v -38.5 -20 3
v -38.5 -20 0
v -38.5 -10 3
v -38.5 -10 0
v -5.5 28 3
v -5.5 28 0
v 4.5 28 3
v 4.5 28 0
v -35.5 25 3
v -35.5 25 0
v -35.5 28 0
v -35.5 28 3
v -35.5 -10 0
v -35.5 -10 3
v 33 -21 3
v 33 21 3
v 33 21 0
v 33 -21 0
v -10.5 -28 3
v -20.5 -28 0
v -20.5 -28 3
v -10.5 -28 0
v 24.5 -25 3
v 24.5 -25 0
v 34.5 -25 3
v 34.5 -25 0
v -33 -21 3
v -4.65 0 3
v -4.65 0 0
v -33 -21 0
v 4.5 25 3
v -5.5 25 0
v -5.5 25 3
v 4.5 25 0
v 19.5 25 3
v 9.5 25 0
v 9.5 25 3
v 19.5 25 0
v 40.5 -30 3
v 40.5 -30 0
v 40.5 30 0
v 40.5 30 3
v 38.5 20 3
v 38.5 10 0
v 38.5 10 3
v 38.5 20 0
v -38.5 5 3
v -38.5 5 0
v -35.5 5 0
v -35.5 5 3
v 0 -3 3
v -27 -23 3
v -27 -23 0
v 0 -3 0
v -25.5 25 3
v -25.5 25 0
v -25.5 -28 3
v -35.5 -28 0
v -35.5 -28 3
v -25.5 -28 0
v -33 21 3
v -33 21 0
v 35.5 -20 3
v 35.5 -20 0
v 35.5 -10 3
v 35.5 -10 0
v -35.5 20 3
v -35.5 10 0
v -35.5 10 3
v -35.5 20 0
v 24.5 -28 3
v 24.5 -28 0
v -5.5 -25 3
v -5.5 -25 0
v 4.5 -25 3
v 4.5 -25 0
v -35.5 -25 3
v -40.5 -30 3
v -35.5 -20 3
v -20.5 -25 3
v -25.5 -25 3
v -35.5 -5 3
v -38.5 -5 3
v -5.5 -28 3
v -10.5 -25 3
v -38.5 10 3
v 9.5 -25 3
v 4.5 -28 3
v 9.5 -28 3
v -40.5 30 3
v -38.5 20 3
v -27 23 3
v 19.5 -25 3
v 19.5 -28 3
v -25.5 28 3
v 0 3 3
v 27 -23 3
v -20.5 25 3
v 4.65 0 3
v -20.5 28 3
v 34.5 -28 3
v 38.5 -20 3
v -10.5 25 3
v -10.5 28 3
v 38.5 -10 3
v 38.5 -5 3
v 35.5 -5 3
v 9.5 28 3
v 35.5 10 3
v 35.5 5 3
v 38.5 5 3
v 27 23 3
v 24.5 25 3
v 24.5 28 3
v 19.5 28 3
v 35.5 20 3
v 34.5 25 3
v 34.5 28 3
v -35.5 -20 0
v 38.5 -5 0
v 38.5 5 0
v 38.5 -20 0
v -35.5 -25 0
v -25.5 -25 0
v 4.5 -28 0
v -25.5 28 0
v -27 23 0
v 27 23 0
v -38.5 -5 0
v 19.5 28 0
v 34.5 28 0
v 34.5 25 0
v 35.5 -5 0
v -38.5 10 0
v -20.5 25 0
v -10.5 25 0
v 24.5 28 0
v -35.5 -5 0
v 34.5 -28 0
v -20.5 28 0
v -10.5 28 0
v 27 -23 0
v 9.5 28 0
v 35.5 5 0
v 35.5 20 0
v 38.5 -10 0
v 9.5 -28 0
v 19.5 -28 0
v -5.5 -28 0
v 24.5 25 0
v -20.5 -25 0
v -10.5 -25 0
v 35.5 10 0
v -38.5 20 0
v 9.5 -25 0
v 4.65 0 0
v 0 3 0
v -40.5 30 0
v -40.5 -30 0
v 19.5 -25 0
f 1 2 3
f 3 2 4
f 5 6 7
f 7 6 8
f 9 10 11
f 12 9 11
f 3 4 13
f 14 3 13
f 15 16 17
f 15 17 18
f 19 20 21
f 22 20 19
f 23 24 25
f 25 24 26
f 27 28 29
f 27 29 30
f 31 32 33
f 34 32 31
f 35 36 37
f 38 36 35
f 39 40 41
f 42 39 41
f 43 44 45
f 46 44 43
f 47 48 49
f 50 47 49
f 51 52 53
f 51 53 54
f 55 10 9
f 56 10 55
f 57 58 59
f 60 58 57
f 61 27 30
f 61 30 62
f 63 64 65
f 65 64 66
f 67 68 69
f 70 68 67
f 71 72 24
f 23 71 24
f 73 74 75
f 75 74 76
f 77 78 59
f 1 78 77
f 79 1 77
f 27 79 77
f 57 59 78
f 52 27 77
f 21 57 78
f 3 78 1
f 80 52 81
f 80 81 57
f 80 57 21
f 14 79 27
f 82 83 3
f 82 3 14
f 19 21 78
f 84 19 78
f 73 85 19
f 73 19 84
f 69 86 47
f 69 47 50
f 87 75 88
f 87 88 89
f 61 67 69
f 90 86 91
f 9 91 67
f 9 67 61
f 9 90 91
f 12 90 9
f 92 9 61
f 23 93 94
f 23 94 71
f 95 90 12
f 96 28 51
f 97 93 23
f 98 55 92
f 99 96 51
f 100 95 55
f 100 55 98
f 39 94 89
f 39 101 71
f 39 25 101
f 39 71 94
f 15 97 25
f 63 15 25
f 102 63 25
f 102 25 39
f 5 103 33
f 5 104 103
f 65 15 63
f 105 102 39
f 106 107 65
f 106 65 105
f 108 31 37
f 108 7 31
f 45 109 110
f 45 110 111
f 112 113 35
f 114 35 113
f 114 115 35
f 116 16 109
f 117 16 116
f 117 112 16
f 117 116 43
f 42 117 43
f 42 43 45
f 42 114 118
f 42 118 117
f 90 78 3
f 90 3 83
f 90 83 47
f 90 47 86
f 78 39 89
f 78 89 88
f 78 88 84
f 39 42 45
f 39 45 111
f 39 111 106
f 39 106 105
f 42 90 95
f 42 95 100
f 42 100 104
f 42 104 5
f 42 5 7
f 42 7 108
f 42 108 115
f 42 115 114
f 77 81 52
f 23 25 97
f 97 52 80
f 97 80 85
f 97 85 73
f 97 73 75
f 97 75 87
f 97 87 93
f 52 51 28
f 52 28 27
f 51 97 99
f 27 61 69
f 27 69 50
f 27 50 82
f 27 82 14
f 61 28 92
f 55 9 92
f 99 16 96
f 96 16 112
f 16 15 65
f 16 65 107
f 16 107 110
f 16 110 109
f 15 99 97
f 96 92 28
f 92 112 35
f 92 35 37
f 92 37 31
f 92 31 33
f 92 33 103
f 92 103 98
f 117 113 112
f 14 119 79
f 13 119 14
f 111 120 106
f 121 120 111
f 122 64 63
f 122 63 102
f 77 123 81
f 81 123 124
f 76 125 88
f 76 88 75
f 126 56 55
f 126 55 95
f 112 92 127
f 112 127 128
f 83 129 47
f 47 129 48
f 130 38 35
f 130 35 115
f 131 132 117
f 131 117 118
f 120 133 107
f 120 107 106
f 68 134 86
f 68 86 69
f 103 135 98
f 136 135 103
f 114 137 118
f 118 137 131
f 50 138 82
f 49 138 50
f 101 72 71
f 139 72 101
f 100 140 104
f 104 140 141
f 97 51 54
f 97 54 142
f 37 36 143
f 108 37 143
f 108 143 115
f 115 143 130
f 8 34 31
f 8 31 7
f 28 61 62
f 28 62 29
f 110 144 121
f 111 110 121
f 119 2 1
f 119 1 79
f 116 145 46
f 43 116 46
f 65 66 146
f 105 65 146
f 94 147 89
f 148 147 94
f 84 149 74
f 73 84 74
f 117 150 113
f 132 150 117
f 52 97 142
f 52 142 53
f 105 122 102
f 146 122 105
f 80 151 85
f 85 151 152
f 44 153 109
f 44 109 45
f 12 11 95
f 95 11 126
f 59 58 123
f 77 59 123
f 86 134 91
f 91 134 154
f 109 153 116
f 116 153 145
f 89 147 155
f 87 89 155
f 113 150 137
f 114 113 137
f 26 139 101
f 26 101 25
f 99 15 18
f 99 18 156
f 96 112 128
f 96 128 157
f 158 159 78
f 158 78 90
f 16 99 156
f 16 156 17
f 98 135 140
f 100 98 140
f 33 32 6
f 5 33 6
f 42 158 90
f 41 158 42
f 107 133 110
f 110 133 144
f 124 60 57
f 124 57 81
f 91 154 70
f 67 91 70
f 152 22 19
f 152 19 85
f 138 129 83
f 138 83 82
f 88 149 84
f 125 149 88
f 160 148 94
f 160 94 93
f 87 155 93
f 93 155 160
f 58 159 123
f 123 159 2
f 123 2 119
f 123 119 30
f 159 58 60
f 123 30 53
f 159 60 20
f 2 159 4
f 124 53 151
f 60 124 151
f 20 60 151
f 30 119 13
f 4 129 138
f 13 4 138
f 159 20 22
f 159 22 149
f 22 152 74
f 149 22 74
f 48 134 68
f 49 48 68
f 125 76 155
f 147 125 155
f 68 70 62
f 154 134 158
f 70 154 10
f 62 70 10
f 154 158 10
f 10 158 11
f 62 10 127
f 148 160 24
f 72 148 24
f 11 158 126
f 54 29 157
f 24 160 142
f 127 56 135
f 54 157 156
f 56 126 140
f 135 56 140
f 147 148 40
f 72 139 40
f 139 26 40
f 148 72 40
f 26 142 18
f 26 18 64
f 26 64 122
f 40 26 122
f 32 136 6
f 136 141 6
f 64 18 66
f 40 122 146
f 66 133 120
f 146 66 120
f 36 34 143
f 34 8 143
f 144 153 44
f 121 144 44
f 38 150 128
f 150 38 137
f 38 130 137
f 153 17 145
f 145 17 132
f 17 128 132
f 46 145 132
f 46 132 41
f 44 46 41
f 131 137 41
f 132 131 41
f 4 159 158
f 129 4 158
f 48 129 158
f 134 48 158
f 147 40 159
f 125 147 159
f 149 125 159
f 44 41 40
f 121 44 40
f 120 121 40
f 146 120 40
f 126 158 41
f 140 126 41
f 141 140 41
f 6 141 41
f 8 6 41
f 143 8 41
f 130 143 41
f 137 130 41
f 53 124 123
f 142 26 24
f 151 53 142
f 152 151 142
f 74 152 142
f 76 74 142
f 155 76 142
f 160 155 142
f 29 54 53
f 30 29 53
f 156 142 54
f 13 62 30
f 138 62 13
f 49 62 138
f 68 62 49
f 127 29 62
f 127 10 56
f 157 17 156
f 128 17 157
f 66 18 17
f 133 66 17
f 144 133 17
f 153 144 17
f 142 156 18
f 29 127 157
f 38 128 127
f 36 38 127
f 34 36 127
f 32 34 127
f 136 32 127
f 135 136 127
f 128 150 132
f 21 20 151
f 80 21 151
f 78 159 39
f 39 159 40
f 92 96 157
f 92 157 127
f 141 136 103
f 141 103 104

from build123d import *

# Parameters (mm, degrees)
SKETCH_1_W          = 81
SKETCH_1_H          = 60
SKETCH_1_W_2        = 10
SKETCH_1_H_2        = 3
SKETCH_1_W_3        = 3
SKETCH_1_H_3        = 10
EXTRUDE_1_DEPTH     = 3
CUT_EXTRUDE_1_DEPTH = 10


with BuildPart() as part:
    # 草图1 → 凸台-拉伸1 (new body)
    with BuildSketch(Plane.XY):
        Rectangle(SKETCH_1_W, SKETCH_1_H)
        with Locations((-30.5, 26.5)):
            Rectangle(SKETCH_1_W_2, SKETCH_1_H_2, mode=Mode.SUBTRACT)
        with Locations((-37, 15)):
            Rectangle(SKETCH_1_W_3, SKETCH_1_H_3, mode=Mode.SUBTRACT)
        with Locations((-37, 0)):
            Rectangle(SKETCH_1_W_3, SKETCH_1_H_3, mode=Mode.SUBTRACT)
        with Locations((-37, -15)):
            Rectangle(SKETCH_1_W_3, SKETCH_1_H_3, mode=Mode.SUBTRACT)
        with Locations((37, -15)):
            Rectangle(SKETCH_1_W_3, SKETCH_1_H_3, mode=Mode.SUBTRACT)
        with Locations((37, 0)):
            Rectangle(SKETCH_1_W_3, SKETCH_1_H_3, mode=Mode.SUBTRACT)
        with Locations((37, 15)):
            Rectangle(SKETCH_1_W_3, SKETCH_1_H_3, mode=Mode.SUBTRACT)
        with Locations((-15.5, 26.5)):
            Rectangle(SKETCH_1_W_2, SKETCH_1_H_2, mode=Mode.SUBTRACT)
        with Locations((-0.5, 26.5)):
            Rectangle(SKETCH_1_W_2, SKETCH_1_H_2, mode=Mode.SUBTRACT)
        with Locations((14.5, 26.5)):
            Rectangle(SKETCH_1_W_2, SKETCH_1_H_2, mode=Mode.SUBTRACT)
        with Locations((29.5, 26.5)):
            Rectangle(SKETCH_1_W_2, SKETCH_1_H_2, mode=Mode.SUBTRACT)
        with Locations((29.5, -26.5)):
            Rectangle(SKETCH_1_W_2, SKETCH_1_H_2, mode=Mode.SUBTRACT)
        with Locations((14.5, -26.5)):
            Rectangle(SKETCH_1_W_2, SKETCH_1_H_2, mode=Mode.SUBTRACT)
        with Locations((-0.5, -26.5)):
            Rectangle(SKETCH_1_W_2, SKETCH_1_H_2, mode=Mode.SUBTRACT)
        with Locations((-15.5, -26.5)):
            Rectangle(SKETCH_1_W_2, SKETCH_1_H_2, mode=Mode.SUBTRACT)
        with Locations((-30.5, -26.5)):
            Rectangle(SKETCH_1_W_2, SKETCH_1_H_2, mode=Mode.SUBTRACT)
    extrude(amount=EXTRUDE_1_DEPTH)

    # 草图2 → 切除-拉伸1 (cut)
    with BuildSketch(Plane.XY.offset(3)):
        Polygon((-27, 23), (27, 23), (0, 3), align=None)
        Polygon((-27, -23), (0, -3), (27, -23), align=None)
        Polygon((33, 21), (33, -21), (4.65, 0), align=None)
        Polygon((-33, 21), (-4.65, 0), (-33, -21), align=None)
    extrude(amount=-CUT_EXTRUDE_1_DEPTH, mode=Mode.SUBTRACT)


solid = part.part
